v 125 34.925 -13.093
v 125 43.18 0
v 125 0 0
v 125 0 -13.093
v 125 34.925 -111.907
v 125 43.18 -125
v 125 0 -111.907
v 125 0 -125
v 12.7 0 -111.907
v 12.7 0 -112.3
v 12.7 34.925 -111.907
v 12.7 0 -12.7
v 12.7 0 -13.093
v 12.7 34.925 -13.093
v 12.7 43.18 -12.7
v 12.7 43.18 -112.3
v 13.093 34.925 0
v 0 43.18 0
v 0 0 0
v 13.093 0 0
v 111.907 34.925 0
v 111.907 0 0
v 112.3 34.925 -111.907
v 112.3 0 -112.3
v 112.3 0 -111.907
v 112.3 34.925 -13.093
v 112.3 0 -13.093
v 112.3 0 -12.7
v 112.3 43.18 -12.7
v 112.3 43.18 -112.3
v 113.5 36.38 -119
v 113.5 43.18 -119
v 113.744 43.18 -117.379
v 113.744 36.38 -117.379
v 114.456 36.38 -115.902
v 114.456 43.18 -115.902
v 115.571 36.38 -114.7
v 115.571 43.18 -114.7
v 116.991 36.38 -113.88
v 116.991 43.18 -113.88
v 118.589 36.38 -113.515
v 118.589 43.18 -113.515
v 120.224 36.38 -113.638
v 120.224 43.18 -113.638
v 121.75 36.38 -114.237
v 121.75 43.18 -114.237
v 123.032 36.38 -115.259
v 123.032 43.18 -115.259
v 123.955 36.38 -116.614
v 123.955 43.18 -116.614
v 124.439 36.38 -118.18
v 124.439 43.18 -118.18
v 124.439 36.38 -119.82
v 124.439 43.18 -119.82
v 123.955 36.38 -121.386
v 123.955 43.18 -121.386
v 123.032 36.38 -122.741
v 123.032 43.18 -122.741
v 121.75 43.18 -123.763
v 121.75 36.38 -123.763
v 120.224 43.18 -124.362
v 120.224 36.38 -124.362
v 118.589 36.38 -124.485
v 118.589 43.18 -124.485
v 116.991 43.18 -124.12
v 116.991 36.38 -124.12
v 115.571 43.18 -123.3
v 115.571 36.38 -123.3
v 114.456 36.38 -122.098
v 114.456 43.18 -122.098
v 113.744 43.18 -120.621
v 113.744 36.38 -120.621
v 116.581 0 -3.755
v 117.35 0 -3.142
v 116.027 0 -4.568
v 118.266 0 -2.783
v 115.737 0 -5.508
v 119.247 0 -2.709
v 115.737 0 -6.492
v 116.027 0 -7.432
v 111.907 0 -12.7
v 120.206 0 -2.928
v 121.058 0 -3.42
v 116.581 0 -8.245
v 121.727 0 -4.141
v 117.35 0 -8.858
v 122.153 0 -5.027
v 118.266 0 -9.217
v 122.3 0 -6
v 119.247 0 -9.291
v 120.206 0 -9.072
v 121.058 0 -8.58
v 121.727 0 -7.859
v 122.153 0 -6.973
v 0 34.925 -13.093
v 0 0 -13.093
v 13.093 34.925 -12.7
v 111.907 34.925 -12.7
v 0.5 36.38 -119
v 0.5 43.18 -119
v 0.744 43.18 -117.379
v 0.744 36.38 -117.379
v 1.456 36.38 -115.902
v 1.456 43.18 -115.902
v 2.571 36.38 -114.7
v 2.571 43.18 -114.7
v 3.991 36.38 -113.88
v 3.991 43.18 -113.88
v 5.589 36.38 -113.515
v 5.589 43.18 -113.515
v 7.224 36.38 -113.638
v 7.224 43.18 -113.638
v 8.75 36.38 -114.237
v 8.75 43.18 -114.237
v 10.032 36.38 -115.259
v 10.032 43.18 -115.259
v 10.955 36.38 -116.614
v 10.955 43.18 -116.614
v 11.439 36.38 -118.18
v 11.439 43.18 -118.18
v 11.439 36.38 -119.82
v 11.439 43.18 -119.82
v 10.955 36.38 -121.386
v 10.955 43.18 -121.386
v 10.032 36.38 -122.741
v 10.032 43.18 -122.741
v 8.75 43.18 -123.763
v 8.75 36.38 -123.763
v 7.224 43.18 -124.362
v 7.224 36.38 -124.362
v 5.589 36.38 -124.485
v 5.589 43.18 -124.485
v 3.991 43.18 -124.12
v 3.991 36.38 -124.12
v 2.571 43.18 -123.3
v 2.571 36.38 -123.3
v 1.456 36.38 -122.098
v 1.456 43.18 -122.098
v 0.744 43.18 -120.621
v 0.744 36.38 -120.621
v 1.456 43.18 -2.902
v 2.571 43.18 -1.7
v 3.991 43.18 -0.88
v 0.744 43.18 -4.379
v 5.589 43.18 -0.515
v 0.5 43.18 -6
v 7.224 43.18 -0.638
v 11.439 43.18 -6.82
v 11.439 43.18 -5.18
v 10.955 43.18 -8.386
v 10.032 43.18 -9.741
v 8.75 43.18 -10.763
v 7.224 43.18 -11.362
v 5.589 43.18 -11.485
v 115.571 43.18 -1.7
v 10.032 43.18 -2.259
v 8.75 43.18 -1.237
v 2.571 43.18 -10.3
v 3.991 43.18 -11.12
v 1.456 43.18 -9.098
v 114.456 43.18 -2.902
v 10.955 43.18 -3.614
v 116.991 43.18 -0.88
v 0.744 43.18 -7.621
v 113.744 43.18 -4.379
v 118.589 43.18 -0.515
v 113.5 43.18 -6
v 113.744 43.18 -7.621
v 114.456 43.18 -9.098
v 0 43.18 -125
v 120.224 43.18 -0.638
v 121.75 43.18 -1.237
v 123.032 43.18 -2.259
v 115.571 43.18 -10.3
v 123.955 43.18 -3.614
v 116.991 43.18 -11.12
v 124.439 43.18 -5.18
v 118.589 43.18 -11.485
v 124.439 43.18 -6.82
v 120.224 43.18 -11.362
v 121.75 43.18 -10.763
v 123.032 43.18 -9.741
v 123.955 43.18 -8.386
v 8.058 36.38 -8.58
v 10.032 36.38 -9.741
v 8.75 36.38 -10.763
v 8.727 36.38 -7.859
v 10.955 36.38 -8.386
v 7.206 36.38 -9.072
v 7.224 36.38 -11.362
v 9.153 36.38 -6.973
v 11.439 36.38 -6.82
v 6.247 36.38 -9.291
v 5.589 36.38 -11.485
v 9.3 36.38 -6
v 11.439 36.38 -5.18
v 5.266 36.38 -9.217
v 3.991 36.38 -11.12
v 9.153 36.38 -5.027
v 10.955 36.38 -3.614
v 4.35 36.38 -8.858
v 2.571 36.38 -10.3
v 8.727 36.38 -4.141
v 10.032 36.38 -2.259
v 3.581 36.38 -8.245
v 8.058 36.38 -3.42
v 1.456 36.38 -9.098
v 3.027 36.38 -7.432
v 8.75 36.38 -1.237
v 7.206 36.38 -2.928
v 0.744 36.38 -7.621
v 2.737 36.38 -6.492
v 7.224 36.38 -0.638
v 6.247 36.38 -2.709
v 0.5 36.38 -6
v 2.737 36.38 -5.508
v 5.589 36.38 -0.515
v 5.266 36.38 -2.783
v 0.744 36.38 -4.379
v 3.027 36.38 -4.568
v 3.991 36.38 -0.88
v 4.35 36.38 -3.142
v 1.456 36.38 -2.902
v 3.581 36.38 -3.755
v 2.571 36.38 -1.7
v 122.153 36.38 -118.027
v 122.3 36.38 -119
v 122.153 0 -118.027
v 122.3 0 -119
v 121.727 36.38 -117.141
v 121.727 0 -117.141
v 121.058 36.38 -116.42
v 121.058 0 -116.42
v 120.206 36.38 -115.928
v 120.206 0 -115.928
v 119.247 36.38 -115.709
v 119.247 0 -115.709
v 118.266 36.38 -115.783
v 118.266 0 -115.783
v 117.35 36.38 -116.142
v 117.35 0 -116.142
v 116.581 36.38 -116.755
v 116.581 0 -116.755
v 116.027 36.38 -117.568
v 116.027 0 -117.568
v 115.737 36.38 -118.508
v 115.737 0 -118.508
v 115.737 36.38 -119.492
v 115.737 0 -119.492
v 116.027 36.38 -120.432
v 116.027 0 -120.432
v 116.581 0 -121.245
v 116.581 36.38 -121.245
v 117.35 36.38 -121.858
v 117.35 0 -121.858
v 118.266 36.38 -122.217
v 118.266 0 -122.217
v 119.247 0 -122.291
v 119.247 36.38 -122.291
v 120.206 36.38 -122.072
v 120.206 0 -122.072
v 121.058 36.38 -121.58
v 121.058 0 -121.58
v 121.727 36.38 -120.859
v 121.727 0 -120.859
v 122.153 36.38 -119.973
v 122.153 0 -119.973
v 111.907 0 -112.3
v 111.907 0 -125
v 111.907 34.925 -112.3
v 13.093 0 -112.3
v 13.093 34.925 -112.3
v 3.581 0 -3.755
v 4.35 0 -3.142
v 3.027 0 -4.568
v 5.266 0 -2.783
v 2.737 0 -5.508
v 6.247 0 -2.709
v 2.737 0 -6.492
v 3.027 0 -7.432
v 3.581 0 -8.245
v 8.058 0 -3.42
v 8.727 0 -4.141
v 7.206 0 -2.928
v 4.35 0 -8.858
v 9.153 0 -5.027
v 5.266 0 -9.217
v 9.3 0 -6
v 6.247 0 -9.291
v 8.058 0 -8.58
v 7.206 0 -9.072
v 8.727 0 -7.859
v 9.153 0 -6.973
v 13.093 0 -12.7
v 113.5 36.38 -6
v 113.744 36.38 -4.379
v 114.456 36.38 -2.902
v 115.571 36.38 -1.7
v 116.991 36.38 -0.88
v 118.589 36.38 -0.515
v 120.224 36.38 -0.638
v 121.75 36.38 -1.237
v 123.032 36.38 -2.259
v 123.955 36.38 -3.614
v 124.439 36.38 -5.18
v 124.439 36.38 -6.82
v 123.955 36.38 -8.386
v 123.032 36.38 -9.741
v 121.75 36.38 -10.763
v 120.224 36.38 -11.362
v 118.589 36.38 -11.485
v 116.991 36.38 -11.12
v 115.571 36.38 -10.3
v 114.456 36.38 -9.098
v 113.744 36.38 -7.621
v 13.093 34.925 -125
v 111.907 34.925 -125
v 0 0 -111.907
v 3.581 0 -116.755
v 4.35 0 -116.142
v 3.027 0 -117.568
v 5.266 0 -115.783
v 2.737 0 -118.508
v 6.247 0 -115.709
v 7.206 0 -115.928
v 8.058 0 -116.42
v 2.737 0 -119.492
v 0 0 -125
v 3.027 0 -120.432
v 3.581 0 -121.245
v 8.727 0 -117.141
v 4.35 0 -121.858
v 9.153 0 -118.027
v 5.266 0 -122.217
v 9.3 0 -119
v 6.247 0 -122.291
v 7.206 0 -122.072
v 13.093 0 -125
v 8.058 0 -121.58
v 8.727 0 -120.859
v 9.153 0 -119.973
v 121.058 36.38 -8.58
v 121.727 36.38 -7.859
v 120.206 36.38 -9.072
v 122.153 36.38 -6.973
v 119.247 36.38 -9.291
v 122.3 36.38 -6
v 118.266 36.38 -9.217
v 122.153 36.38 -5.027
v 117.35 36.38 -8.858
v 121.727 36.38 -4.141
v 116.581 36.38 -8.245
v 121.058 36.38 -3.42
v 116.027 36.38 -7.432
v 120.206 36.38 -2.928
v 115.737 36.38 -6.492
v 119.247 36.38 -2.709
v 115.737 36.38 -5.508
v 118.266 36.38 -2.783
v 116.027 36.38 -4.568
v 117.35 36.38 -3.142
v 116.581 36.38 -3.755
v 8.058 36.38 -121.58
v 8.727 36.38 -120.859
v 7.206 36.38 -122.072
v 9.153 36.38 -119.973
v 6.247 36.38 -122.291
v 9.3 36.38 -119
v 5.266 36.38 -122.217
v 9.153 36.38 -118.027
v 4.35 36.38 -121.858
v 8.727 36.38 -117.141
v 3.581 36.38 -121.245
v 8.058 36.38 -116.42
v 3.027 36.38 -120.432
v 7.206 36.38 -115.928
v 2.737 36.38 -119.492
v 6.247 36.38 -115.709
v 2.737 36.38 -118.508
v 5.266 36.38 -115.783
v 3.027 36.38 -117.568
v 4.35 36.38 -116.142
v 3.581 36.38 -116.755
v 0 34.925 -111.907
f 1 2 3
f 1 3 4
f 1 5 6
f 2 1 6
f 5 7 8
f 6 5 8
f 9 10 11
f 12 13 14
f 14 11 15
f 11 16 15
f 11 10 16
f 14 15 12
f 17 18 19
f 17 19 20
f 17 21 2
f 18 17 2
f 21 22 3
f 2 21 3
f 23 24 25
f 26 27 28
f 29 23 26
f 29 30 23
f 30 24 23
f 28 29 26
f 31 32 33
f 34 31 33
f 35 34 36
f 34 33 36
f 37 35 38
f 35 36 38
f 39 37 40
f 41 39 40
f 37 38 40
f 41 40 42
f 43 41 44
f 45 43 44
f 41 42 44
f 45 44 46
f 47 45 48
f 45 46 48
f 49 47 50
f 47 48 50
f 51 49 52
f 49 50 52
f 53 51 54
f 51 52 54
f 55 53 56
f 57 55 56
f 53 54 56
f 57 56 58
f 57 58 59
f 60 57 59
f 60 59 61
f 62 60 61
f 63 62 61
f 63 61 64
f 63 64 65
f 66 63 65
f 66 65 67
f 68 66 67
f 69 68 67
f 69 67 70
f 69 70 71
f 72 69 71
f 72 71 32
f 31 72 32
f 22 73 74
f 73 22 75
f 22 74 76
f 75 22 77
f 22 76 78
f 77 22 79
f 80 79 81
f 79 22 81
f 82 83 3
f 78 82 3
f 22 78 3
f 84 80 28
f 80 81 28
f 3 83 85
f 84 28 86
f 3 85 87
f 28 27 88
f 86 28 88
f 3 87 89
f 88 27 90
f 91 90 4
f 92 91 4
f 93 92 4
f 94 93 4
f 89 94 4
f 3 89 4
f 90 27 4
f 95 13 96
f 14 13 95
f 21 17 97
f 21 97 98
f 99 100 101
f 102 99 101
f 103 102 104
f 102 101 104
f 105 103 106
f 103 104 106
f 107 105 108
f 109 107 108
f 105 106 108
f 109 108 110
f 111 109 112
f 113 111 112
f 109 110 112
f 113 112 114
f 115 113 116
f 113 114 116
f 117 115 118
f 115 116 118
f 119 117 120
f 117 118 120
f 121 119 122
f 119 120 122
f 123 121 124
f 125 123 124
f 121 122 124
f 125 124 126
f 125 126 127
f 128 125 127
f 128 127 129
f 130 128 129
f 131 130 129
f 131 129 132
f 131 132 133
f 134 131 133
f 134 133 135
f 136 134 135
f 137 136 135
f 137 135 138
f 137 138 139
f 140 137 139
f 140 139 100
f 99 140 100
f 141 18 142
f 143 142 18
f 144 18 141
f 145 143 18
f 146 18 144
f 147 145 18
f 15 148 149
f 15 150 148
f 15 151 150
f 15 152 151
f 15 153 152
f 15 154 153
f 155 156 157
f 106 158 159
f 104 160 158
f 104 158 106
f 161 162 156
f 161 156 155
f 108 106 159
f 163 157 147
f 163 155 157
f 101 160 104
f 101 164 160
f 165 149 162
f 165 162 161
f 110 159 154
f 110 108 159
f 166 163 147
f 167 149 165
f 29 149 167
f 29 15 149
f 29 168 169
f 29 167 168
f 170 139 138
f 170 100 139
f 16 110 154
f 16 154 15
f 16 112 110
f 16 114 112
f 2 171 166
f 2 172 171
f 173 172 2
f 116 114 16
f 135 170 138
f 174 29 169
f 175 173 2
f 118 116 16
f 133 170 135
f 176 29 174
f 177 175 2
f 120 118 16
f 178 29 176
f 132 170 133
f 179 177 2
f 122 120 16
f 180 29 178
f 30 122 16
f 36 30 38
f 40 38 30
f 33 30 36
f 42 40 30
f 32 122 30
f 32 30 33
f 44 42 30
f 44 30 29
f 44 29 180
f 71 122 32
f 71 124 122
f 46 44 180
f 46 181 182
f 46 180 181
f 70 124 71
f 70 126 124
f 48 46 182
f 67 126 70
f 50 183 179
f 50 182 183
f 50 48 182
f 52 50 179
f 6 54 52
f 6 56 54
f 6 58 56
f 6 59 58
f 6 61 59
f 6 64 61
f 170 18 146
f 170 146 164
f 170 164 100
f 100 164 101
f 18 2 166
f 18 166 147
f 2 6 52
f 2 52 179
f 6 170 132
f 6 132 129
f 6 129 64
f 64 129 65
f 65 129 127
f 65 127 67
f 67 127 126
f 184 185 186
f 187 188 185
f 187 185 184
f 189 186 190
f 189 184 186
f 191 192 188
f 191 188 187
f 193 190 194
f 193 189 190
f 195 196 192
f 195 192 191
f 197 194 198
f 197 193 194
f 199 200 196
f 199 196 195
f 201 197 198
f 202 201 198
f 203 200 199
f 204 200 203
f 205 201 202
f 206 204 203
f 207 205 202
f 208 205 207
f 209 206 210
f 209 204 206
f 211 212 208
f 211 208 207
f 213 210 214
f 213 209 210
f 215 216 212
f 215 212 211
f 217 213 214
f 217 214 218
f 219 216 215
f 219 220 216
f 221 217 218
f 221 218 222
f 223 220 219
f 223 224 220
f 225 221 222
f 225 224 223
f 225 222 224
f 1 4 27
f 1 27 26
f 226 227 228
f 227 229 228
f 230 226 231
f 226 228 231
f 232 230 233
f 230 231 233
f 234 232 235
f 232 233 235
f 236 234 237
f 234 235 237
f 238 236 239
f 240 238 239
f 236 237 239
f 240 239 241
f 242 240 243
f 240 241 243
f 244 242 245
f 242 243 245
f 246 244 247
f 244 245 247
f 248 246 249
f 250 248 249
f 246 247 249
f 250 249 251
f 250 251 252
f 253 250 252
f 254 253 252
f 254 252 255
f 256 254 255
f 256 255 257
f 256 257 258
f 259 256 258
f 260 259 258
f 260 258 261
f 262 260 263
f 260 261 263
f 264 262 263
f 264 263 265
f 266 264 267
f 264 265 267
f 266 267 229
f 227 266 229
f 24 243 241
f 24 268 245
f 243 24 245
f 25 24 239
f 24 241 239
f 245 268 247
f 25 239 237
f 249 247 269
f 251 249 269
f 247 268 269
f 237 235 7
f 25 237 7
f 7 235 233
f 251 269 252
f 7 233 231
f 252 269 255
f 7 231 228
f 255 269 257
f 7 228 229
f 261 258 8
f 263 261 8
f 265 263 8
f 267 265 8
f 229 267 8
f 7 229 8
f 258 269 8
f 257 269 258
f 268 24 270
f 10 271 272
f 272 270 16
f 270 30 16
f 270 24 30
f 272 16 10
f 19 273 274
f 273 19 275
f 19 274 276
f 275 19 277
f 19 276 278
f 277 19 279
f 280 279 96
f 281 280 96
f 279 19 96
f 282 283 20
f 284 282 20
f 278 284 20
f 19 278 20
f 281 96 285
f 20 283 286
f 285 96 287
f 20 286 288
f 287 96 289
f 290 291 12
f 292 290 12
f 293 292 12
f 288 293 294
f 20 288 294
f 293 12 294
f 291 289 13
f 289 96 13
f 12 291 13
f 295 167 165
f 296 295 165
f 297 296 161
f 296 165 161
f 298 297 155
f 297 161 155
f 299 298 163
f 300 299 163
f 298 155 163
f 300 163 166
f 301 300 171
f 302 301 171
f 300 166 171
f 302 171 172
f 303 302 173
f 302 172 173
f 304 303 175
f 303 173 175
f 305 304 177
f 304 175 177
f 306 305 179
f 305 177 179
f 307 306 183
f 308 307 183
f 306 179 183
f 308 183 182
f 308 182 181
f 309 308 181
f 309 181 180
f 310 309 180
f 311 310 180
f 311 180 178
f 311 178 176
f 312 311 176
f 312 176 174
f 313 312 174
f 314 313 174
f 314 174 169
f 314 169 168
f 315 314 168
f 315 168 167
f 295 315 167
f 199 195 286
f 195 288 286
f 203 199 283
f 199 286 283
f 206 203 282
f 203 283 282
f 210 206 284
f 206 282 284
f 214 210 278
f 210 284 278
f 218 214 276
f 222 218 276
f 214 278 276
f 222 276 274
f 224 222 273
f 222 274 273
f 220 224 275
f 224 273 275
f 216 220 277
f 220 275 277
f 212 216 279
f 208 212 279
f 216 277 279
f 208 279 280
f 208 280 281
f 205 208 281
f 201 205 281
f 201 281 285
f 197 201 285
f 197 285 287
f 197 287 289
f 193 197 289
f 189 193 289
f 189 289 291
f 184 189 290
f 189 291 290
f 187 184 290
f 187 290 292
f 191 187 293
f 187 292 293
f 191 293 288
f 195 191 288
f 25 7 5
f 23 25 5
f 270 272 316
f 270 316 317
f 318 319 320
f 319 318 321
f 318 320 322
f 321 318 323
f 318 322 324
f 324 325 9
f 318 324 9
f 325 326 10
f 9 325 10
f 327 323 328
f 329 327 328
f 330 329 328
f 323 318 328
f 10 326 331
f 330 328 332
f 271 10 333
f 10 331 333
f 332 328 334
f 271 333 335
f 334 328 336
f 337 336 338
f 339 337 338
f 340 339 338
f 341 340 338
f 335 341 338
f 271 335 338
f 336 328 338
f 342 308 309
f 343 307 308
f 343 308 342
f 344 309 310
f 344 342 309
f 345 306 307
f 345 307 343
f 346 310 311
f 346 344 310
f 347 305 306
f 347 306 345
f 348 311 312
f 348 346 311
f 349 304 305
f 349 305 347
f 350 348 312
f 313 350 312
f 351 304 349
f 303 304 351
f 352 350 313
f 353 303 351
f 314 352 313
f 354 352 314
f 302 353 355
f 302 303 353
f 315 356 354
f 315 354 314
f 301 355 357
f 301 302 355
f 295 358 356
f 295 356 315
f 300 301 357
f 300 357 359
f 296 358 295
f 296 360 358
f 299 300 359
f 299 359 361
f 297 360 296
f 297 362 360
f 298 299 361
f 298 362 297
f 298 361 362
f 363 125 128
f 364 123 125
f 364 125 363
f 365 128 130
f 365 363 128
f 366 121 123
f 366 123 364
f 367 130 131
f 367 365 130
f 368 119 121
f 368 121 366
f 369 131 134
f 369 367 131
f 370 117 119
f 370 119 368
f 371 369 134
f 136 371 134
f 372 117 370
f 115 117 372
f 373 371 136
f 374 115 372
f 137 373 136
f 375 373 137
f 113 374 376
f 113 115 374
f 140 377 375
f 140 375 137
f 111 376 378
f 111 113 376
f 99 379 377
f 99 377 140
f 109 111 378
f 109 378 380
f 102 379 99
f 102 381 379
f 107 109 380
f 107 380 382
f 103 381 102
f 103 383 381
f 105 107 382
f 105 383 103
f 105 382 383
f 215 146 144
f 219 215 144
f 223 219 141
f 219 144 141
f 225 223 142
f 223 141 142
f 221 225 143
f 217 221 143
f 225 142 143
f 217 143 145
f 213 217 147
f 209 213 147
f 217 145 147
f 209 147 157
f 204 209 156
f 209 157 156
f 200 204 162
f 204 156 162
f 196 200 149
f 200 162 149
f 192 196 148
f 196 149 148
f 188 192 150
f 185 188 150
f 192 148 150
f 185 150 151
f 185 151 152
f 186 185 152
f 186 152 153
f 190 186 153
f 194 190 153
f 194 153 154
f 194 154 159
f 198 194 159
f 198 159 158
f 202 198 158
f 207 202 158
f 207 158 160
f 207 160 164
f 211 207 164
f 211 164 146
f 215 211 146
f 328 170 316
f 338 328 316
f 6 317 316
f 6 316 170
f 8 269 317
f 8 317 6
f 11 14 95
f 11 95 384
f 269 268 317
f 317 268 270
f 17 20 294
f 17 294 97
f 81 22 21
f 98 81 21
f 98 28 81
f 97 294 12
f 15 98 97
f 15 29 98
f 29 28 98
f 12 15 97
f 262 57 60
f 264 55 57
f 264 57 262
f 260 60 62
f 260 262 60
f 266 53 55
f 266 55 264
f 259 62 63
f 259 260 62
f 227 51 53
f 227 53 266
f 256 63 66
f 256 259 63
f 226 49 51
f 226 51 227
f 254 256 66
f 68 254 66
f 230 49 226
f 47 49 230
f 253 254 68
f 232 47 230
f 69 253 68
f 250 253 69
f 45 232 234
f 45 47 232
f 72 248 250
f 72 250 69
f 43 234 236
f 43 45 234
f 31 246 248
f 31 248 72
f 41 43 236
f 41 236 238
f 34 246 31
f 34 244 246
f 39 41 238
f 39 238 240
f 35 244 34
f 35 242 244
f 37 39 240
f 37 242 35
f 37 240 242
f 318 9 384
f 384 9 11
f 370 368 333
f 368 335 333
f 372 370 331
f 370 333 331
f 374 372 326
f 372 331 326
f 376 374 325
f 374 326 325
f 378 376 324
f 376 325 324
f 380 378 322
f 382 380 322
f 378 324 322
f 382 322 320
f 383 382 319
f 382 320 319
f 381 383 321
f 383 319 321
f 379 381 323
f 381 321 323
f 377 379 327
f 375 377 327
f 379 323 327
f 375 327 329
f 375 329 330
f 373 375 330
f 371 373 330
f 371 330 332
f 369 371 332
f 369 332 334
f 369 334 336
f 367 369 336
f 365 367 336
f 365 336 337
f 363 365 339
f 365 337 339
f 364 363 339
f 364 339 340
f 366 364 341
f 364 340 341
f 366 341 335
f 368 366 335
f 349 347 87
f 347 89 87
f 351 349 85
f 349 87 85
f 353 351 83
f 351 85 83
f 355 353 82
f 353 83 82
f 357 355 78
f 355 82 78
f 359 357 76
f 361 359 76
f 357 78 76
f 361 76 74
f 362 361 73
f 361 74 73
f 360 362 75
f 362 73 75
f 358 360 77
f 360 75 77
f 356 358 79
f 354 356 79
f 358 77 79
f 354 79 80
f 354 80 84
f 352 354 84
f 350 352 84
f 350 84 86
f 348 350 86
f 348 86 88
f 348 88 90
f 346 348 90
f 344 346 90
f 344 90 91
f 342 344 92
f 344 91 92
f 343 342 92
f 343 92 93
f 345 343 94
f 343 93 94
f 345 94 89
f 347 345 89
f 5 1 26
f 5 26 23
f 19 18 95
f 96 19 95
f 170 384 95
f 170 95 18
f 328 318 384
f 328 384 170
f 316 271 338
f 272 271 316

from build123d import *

# Parameters (mm, degrees)
SKETCH1_W                 = 125
SKETCH1_H                 = 125
EXTRUDE1_DEPTH            = 43.18
SKETCH2_W                 = 99.6
SKETCH2_H                 = 99.6
CUT_EXTRUDE1_DEPTH        = 182.973933298
SKETCH3_W                 = 98.8148352
SKETCH3_H                 = 34.925
CUT_EXTRUDE2_DEPTH        = 182.973933298
SKETCH6_W                 = 98.8148352
SKETCH6_H                 = 34.925
CUT_EXTRUDE3_DEPTH        = 182.973933298
HOLE_WIZARD_2_D           = 6.6
HOLE_WIZARD_2_CBORE_D     = 11
HOLE_WIZARD_2_CBORE_DEPTH = 6.8


with BuildPart() as part:
    # Sketch1 → Extrude1 (new body)
    with BuildSketch(Plane(origin=(0, 0, 0), x_dir=(1, 0, 0), z_dir=(0, 1, 0))):
        with Locations((62.5, 62.5)):
            Rectangle(SKETCH1_W, SKETCH1_H)
    extrude(amount=EXTRUDE1_DEPTH)

    # Sketch2 → Cut-Extrude1 (cut, through all)
    with BuildSketch(Plane(origin=(0, 43.18, 0), x_dir=(-1, 0, 0), z_dir=(0, 1, 0))):
        with Locations((-62.5, -62.5)):
            Rectangle(SKETCH2_W, SKETCH2_H)
    extrude(amount=-CUT_EXTRUDE1_DEPTH, mode=Mode.SUBTRACT)

    # Sketch3 → Cut-Extrude2 (cut, through all)
    with BuildSketch(Plane.XY):
        with Locations((62.5, 17.4625)):
            Rectangle(SKETCH3_W, SKETCH3_H)
    extrude(amount=-CUT_EXTRUDE2_DEPTH, mode=Mode.SUBTRACT)

    # Sketch6 → Cut-Extrude3 (cut, through all)
    with BuildSketch(Plane(origin=(125, 0, 0), x_dir=(0, 0, -1), z_dir=(1, 0, 0))):
        with Locations((62.5, 17.4625)):
            Rectangle(SKETCH6_W, SKETCH6_H)
    extrude(amount=-CUT_EXTRUDE3_DEPTH, mode=Mode.SUBTRACT)

    # 打孔尺寸(%根据)内六角圆柱头螺钉的类型2 (through all)
    with Locations(Plane(origin=(0, 43.18, 0), x_dir=(-1, 0, 0), z_dir=(0, 1, 0))):
        with Locations((-6, -6), (-119, -6), (-119, -119), (-6, -119)):
            CounterBoreHole(HOLE_WIZARD_2_D / 2, HOLE_WIZARD_2_CBORE_D / 2, HOLE_WIZARD_2_CBORE_DEPTH)


solid = part.part
